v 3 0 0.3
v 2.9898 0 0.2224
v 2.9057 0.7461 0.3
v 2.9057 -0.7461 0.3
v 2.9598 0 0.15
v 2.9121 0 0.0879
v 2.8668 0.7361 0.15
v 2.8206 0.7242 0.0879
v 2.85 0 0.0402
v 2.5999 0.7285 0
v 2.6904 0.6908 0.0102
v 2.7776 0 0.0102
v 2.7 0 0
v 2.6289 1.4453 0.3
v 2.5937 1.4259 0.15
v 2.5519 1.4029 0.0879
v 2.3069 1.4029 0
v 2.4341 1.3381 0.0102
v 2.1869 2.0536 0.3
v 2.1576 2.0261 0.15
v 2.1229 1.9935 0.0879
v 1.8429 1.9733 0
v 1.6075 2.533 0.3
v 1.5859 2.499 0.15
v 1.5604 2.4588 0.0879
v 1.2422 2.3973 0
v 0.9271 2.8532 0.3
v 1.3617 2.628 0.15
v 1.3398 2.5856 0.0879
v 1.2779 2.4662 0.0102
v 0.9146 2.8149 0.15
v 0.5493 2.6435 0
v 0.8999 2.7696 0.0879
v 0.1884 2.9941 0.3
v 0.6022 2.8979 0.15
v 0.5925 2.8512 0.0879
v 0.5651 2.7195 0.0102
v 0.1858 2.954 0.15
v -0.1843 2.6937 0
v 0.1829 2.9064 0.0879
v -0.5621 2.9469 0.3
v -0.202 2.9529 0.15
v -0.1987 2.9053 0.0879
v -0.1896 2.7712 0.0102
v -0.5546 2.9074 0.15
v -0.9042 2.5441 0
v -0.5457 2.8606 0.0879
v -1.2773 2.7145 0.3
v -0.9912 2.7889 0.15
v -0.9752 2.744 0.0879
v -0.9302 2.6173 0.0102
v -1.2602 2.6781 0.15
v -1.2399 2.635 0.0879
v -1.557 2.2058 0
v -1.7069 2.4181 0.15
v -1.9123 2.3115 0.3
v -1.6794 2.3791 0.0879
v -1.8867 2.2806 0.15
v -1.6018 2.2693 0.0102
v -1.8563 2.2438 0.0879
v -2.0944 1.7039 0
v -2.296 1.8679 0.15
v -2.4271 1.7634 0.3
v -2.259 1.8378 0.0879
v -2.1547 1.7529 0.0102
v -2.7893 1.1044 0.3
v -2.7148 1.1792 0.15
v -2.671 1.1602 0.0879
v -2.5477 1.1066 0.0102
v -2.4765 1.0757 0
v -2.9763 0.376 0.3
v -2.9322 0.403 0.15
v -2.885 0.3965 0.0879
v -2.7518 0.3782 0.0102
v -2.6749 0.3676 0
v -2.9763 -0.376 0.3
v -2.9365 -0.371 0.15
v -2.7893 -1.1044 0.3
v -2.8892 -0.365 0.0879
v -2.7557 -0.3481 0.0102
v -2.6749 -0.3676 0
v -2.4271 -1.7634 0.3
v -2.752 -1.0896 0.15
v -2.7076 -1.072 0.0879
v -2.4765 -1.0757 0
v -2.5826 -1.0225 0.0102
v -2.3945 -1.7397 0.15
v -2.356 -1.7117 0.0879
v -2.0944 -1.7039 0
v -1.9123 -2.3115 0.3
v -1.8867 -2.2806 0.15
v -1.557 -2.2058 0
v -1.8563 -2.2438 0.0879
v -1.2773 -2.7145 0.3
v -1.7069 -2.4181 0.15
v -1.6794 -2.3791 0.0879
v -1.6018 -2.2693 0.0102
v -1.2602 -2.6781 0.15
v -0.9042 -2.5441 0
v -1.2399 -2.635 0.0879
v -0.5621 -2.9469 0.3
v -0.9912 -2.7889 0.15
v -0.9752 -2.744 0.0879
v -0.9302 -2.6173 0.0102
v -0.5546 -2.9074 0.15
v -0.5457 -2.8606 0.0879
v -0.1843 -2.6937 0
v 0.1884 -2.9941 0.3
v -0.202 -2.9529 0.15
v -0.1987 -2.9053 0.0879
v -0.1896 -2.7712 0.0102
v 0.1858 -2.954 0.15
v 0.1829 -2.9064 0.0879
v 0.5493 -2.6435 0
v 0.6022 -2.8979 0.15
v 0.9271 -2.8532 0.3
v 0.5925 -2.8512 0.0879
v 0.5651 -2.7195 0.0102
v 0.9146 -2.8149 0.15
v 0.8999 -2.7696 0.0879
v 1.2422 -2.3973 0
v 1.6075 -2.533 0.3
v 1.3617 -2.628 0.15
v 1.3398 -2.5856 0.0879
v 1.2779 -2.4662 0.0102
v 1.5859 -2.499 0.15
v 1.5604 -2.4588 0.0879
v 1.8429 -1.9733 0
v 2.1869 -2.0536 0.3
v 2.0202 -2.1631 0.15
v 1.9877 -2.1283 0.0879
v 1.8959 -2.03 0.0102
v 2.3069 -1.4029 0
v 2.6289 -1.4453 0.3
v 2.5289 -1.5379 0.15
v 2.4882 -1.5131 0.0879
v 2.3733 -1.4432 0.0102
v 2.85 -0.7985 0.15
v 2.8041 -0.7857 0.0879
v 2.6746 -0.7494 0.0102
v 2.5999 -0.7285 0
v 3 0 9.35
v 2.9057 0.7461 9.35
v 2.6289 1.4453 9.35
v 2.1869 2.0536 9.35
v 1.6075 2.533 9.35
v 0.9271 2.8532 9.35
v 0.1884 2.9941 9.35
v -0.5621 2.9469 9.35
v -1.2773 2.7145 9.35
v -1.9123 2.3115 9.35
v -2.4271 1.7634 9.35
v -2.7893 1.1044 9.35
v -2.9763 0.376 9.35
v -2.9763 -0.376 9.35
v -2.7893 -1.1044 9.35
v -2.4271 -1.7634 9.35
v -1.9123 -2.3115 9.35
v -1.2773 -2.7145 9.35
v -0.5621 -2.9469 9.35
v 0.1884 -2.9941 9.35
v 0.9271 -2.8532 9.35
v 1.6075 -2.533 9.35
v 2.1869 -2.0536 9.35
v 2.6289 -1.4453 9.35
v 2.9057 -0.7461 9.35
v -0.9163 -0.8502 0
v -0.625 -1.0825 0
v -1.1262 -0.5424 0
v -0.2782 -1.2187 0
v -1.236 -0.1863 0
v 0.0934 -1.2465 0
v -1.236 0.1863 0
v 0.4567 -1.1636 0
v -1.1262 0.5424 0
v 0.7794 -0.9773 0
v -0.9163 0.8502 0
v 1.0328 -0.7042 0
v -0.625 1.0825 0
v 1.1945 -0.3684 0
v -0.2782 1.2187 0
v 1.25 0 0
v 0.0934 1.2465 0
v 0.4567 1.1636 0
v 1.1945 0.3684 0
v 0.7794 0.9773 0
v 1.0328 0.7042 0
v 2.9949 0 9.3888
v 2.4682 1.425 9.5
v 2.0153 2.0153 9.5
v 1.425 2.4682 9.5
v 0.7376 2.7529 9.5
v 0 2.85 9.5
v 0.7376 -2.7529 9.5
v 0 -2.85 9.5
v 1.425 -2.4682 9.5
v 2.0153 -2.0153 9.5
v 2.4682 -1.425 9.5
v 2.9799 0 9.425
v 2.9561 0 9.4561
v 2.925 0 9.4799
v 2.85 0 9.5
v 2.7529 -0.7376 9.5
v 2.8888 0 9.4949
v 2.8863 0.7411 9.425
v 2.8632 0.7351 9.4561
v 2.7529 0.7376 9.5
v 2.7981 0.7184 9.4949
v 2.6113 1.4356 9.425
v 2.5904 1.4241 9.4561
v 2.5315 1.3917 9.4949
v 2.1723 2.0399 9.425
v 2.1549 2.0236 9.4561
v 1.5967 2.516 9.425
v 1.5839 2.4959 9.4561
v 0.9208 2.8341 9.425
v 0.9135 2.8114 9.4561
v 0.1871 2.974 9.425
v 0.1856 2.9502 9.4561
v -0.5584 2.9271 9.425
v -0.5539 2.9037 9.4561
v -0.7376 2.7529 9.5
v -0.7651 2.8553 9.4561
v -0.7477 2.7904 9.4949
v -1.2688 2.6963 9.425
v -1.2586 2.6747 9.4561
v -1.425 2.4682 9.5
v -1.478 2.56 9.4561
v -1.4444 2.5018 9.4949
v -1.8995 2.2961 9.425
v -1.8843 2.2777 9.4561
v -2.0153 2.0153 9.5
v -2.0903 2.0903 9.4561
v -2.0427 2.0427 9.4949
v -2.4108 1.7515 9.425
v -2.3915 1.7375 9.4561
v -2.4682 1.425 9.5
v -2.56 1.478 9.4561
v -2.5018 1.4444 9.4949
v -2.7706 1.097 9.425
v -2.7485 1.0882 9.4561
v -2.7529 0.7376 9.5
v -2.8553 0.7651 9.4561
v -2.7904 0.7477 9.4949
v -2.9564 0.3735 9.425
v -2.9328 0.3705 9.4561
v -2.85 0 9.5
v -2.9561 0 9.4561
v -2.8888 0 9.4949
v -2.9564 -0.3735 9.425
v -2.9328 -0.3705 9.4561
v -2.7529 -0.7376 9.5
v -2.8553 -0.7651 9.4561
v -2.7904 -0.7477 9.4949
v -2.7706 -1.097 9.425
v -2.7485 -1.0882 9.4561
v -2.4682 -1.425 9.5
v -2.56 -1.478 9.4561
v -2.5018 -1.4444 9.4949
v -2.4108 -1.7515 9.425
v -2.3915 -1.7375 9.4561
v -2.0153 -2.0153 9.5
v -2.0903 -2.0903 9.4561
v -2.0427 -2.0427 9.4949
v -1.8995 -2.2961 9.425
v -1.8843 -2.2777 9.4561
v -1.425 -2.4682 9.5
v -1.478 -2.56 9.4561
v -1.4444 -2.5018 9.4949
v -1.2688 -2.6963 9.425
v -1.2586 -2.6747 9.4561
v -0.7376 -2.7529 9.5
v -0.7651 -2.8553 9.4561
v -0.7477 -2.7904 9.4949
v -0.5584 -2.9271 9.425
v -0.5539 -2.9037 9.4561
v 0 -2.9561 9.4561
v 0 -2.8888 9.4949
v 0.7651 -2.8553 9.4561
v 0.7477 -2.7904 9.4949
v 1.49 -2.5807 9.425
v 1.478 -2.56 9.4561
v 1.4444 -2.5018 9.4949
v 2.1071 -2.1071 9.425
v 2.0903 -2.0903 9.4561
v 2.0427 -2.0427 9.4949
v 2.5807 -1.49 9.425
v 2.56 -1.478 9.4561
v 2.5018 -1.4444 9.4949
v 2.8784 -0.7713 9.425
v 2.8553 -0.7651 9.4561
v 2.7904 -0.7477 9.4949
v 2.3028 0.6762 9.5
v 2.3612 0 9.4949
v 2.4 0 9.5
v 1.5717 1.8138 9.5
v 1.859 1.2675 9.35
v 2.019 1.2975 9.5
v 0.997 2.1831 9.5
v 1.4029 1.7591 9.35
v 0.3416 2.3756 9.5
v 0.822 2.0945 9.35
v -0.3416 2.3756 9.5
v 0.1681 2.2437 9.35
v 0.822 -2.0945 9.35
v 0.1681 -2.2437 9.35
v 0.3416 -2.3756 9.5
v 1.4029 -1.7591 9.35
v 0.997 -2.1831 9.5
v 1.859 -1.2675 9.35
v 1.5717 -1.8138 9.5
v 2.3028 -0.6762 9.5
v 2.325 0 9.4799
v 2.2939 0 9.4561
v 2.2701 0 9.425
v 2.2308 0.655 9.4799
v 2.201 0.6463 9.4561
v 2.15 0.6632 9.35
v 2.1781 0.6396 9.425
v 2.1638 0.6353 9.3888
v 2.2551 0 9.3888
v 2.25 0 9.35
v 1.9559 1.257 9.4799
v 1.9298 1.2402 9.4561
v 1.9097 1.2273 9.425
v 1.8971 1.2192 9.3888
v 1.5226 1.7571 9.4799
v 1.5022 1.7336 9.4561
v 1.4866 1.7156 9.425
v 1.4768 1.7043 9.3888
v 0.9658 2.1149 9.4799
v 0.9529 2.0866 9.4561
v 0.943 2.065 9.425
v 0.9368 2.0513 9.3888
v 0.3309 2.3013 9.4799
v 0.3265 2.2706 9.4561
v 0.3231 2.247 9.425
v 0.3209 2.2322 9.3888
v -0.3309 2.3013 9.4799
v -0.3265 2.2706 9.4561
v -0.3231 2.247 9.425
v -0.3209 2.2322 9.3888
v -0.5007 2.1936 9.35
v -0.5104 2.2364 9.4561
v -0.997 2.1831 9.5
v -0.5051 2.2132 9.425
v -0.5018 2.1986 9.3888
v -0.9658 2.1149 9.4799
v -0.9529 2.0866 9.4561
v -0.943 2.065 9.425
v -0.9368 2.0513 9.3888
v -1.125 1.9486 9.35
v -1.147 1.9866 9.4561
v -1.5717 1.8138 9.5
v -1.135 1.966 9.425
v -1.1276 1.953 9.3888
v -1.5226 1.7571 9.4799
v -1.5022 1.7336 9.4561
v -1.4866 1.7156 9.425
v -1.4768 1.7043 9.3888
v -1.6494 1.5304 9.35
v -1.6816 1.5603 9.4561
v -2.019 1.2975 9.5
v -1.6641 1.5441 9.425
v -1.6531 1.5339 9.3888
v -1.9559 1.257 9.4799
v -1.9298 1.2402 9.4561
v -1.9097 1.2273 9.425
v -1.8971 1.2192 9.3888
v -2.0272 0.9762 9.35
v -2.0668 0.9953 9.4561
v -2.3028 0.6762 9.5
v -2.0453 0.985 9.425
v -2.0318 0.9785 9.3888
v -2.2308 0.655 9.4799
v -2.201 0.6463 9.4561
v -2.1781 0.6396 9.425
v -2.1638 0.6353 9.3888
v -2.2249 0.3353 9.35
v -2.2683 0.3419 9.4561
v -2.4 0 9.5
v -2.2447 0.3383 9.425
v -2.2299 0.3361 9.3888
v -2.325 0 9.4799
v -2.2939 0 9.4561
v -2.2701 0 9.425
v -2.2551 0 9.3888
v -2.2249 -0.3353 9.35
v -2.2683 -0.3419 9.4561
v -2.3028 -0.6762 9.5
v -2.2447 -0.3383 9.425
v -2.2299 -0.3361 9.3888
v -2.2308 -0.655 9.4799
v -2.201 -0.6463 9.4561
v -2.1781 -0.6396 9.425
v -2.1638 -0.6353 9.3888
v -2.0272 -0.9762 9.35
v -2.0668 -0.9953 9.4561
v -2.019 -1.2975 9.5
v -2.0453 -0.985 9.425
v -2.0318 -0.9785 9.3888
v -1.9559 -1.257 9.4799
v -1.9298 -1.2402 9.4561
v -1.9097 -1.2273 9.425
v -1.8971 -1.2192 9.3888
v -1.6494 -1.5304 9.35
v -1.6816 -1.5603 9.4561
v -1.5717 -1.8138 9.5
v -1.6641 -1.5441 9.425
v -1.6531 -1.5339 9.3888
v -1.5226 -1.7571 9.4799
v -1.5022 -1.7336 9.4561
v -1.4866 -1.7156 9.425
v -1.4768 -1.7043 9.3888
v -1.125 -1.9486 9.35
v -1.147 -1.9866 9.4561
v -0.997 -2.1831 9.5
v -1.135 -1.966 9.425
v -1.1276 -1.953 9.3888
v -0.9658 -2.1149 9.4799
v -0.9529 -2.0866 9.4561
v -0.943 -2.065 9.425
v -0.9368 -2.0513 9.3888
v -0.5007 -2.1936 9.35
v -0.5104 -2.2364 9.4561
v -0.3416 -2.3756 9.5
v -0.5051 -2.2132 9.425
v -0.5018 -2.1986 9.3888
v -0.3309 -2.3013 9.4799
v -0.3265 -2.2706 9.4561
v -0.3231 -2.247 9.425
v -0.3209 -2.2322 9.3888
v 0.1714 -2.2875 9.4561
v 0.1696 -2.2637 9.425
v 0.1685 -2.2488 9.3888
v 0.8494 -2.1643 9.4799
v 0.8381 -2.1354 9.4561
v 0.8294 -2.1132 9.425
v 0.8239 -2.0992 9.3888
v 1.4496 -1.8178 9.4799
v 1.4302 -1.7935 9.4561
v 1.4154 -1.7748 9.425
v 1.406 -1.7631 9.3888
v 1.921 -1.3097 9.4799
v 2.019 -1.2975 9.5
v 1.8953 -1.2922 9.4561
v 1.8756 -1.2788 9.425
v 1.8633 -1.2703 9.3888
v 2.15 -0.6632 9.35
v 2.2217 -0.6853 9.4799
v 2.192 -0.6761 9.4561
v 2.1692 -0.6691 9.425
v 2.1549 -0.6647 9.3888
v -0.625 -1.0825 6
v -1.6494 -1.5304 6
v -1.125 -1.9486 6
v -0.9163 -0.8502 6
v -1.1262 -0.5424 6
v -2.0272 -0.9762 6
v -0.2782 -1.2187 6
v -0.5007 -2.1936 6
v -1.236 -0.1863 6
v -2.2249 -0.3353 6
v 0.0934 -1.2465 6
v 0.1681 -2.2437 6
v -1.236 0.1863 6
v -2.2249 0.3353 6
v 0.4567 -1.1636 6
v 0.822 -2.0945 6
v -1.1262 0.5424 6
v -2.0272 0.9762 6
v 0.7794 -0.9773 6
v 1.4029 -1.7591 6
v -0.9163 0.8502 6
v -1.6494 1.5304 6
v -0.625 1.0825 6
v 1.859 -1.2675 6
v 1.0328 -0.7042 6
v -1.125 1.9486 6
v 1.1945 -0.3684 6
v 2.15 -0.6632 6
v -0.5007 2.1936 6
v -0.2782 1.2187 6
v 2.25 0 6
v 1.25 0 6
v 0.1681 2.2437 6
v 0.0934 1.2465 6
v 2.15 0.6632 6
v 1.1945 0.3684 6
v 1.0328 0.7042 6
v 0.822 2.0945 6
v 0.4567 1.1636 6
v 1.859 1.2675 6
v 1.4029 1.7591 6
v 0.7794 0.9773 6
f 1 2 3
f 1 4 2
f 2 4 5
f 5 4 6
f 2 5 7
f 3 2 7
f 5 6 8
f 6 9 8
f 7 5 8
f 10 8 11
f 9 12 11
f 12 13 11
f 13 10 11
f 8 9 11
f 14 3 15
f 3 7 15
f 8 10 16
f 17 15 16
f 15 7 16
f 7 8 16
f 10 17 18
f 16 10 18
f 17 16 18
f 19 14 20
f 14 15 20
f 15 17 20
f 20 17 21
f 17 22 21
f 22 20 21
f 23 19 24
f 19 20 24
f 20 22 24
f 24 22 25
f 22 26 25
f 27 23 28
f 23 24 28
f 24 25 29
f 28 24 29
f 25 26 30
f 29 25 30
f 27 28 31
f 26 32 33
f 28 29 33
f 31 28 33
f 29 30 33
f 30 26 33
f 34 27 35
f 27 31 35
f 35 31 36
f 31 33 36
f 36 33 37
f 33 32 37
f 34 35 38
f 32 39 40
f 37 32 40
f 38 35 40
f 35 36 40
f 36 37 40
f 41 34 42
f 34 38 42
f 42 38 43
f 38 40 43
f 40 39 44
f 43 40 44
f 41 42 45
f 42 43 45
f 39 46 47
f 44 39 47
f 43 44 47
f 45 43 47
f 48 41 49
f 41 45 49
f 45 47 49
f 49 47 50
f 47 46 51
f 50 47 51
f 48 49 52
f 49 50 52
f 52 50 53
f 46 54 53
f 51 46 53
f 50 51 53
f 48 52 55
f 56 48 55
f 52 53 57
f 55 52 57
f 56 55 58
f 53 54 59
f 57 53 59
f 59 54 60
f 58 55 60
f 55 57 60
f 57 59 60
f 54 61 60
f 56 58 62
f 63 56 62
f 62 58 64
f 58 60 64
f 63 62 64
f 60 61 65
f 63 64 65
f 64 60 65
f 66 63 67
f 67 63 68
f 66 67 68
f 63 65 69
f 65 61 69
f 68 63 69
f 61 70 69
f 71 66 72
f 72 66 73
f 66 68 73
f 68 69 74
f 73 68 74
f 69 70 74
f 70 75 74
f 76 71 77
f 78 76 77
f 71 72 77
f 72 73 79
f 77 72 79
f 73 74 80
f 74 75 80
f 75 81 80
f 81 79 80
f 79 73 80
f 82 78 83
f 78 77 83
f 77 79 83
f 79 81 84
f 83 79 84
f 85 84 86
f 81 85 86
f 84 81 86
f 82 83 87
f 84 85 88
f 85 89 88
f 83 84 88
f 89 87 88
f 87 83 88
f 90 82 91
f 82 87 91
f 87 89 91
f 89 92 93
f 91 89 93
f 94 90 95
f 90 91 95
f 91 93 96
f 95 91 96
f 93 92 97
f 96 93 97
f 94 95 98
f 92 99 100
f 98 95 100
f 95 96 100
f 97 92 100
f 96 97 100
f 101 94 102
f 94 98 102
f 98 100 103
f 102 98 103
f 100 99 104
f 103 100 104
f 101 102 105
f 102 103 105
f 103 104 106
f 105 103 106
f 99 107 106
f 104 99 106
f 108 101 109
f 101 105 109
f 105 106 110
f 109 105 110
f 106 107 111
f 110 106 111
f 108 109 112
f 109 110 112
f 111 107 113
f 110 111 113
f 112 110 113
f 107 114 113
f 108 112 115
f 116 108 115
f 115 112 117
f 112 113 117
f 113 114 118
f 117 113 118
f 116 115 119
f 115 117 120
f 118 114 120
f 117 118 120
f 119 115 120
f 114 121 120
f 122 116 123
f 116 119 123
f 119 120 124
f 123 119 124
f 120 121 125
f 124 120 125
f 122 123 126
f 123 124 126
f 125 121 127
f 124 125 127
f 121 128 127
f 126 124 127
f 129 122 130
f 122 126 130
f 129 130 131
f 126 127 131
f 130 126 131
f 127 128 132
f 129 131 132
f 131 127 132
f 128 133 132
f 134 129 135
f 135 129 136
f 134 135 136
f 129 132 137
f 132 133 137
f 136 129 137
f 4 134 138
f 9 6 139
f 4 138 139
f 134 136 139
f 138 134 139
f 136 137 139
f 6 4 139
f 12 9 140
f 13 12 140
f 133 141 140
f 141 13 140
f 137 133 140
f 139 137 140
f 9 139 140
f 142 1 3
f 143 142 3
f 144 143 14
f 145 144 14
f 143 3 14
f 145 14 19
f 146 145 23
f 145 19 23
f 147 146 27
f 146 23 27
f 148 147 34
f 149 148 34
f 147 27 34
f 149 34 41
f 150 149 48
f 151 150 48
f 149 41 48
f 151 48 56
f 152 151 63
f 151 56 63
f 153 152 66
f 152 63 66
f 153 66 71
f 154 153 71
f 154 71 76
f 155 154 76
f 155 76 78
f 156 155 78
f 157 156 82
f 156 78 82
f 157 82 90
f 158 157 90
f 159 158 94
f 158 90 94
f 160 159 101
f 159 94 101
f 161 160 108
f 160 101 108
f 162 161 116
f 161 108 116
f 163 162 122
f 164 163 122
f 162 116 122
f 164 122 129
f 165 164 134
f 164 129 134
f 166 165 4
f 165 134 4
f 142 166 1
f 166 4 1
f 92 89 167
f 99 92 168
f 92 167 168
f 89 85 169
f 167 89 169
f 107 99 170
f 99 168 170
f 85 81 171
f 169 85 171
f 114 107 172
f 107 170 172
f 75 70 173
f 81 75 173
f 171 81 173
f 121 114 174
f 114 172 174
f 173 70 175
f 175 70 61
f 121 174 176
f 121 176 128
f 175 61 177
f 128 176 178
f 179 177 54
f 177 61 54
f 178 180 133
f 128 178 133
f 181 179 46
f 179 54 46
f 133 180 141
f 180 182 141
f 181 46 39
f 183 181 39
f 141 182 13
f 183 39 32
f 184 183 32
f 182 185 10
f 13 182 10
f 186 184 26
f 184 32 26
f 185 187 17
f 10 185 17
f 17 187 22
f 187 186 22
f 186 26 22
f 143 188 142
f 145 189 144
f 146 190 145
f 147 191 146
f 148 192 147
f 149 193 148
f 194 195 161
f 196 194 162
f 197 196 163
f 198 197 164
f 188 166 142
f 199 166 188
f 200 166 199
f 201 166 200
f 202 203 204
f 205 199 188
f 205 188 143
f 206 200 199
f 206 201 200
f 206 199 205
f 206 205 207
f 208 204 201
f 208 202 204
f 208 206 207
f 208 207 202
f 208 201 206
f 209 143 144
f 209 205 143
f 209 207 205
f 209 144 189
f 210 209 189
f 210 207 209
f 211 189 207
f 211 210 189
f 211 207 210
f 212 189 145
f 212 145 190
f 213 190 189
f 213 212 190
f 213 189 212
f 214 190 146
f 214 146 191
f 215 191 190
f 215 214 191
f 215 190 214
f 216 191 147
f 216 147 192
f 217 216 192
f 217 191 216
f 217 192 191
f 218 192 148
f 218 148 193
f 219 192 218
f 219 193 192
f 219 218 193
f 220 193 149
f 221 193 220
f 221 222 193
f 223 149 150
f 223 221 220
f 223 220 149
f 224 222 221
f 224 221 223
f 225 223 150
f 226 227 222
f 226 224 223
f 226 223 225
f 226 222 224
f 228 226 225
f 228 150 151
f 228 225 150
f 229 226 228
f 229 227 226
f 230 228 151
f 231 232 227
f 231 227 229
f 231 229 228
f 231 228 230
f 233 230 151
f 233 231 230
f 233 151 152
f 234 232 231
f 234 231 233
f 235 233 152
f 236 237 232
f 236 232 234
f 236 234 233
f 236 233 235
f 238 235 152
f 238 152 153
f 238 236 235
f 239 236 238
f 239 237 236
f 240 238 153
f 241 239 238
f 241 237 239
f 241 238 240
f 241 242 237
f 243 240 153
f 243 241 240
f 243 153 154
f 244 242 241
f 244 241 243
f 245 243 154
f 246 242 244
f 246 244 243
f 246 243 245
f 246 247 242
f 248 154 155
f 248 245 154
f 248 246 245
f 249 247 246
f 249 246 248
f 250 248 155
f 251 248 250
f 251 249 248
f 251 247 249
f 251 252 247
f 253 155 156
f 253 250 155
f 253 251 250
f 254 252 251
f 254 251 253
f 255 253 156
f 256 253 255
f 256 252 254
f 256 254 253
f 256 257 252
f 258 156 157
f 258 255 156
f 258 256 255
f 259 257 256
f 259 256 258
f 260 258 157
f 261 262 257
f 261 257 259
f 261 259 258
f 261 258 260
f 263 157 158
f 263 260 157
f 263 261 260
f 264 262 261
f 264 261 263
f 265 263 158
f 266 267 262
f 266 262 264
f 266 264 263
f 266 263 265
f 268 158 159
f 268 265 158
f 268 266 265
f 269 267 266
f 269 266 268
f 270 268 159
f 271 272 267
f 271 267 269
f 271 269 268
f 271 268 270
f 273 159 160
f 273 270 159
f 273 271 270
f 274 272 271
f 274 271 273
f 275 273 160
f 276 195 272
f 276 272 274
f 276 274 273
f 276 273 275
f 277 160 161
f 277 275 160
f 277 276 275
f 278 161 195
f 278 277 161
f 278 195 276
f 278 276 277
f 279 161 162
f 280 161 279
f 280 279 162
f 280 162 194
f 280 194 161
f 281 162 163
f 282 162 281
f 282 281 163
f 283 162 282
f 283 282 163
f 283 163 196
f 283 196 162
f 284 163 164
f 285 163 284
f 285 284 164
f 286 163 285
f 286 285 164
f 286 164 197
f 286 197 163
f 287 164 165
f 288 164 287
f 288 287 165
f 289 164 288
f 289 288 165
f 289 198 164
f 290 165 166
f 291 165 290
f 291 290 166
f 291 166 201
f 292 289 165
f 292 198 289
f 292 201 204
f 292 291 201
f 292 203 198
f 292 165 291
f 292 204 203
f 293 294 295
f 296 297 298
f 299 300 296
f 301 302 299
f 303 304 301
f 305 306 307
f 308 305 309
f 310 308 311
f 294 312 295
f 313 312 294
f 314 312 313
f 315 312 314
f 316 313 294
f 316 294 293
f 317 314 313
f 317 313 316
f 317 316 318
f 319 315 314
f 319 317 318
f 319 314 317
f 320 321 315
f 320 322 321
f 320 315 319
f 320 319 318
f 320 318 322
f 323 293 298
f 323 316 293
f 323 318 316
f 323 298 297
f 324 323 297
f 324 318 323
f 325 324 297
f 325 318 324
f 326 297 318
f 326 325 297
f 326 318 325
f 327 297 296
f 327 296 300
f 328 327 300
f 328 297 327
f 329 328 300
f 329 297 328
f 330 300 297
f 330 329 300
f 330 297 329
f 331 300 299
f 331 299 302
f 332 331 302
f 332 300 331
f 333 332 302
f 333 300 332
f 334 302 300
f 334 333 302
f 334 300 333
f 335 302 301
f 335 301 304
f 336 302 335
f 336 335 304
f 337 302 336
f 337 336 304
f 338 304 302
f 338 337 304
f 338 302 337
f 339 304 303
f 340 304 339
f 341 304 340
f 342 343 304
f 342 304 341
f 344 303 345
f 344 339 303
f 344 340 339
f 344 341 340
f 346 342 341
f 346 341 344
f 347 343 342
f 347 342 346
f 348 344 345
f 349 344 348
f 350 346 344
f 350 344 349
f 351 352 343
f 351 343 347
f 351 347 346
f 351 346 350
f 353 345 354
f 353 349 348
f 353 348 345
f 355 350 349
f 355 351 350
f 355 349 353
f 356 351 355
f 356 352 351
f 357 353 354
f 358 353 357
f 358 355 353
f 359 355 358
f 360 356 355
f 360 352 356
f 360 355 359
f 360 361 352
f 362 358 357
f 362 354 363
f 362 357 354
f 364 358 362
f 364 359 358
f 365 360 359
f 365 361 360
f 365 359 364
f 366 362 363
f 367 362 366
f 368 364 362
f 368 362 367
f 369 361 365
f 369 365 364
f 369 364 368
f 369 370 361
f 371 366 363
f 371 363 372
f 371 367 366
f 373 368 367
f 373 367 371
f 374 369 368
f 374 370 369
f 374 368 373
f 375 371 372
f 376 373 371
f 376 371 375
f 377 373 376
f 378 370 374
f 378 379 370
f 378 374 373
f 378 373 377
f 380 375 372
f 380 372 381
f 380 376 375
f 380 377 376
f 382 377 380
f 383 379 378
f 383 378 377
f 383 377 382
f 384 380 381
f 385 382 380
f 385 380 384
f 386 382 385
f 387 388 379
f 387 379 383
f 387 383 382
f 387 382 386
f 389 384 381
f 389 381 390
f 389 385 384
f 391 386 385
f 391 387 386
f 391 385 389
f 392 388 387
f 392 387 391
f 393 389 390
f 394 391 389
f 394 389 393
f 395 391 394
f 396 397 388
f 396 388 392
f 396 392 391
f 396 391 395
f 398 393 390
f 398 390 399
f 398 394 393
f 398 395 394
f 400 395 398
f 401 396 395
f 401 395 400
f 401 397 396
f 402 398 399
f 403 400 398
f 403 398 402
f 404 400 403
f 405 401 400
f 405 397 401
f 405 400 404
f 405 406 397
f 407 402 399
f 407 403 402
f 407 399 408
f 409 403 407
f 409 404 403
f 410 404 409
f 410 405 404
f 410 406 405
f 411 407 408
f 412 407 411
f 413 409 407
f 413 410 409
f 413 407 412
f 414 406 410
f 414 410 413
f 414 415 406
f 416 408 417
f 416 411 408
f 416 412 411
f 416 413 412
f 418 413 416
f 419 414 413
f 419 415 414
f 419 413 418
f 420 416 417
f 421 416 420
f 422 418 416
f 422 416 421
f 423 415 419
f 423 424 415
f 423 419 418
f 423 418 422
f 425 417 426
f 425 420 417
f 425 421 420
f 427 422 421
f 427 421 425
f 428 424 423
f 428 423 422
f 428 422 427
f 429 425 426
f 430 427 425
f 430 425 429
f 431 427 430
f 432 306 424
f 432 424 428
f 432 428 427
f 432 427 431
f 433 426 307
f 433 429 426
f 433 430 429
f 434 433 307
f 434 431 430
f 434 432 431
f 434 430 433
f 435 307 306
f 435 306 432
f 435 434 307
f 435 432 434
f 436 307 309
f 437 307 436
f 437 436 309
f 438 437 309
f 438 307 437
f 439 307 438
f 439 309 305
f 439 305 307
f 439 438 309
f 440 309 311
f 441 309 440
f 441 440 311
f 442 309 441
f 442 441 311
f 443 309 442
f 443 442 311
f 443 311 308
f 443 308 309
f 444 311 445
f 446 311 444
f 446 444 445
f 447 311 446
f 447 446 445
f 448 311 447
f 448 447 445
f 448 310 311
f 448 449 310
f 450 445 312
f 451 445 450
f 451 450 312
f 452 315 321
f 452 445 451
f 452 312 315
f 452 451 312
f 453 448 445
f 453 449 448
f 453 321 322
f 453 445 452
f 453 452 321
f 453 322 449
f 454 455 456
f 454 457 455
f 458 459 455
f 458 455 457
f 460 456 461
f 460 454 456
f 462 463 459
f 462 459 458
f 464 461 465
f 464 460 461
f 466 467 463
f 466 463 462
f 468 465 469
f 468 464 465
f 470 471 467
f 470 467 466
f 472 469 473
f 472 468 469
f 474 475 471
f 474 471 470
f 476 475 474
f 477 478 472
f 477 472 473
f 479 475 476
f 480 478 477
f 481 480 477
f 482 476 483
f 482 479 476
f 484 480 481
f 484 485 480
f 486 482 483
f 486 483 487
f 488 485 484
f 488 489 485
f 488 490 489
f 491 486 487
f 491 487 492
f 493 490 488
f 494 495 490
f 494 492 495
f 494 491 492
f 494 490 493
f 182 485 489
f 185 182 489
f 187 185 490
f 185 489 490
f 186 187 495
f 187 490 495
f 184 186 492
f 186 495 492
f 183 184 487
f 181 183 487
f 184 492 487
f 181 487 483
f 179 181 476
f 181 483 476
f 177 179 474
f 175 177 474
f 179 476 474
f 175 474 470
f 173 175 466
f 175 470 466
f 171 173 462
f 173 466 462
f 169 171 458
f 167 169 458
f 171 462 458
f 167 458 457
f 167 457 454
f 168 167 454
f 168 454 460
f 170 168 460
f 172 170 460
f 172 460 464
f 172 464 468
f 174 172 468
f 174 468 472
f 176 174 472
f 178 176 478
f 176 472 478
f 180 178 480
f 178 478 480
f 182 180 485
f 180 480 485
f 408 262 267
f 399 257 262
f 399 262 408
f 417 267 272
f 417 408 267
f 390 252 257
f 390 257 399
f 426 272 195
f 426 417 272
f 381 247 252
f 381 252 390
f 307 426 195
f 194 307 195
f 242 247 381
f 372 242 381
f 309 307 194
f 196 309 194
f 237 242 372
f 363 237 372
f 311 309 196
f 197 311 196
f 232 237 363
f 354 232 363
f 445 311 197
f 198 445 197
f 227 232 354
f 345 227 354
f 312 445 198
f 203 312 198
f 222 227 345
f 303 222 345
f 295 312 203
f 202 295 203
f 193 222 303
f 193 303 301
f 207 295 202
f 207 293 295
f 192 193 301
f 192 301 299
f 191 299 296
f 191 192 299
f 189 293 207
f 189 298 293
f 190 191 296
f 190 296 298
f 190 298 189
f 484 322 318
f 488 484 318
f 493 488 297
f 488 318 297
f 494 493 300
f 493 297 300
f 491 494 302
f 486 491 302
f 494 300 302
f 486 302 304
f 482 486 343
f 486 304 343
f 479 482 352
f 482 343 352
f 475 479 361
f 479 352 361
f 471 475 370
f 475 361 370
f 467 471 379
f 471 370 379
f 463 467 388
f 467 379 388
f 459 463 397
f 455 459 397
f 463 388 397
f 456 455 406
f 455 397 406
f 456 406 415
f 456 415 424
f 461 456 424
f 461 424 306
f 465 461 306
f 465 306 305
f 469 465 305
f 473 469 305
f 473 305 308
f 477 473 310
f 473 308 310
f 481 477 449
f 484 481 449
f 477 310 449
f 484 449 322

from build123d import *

# Parameters (mm, degrees)
SKETCH1_R           = 3
BOSS_EXTRUDE1_DEPTH = 9.5
SKETCH2_R           = 2.25
CUT_EXTRUDE1_DEPTH  = 3.5
SKETCH3_R           = 1.25
CUT_EXTRUDE2_DEPTH  = 6
FILLET1_R           = 0.15
FILLET2_R           = 0.3


with BuildPart() as part:
    # Sketch1 → Boss-Extrude1 (new body)
    with BuildSketch(Plane.XY):
        Circle(SKETCH1_R)
    extrude(amount=BOSS_EXTRUDE1_DEPTH)

    # Sketch2 → Cut-Extrude1 (cut)
    with BuildSketch(Plane.XY.offset(9.5)):
        Circle(SKETCH2_R)
    extrude(amount=-CUT_EXTRUDE1_DEPTH, mode=Mode.SUBTRACT)

    # Sketch3 → Cut-Extrude2 (cut)
    with BuildSketch(Plane.XY.offset(6)):
        Circle(SKETCH3_R)
    extrude(amount=-CUT_EXTRUDE2_DEPTH, mode=Mode.SUBTRACT)

    # Fillet1
    fillet1_edges = [part.edges().sort_by_distance(p)[0] for p in [
        (-3, 0, 9.5),
        (-2.25, 0, 9.5),
    ]]
    fillet(fillet1_edges, radius=FILLET1_R)

    # Fillet2
    fillet2_edges = [part.edges().sort_by_distance(p)[0] for p in [
        (-3, 0, 0),
    ]]
    fillet(fillet2_edges, radius=FILLET2_R)


solid = part.part
